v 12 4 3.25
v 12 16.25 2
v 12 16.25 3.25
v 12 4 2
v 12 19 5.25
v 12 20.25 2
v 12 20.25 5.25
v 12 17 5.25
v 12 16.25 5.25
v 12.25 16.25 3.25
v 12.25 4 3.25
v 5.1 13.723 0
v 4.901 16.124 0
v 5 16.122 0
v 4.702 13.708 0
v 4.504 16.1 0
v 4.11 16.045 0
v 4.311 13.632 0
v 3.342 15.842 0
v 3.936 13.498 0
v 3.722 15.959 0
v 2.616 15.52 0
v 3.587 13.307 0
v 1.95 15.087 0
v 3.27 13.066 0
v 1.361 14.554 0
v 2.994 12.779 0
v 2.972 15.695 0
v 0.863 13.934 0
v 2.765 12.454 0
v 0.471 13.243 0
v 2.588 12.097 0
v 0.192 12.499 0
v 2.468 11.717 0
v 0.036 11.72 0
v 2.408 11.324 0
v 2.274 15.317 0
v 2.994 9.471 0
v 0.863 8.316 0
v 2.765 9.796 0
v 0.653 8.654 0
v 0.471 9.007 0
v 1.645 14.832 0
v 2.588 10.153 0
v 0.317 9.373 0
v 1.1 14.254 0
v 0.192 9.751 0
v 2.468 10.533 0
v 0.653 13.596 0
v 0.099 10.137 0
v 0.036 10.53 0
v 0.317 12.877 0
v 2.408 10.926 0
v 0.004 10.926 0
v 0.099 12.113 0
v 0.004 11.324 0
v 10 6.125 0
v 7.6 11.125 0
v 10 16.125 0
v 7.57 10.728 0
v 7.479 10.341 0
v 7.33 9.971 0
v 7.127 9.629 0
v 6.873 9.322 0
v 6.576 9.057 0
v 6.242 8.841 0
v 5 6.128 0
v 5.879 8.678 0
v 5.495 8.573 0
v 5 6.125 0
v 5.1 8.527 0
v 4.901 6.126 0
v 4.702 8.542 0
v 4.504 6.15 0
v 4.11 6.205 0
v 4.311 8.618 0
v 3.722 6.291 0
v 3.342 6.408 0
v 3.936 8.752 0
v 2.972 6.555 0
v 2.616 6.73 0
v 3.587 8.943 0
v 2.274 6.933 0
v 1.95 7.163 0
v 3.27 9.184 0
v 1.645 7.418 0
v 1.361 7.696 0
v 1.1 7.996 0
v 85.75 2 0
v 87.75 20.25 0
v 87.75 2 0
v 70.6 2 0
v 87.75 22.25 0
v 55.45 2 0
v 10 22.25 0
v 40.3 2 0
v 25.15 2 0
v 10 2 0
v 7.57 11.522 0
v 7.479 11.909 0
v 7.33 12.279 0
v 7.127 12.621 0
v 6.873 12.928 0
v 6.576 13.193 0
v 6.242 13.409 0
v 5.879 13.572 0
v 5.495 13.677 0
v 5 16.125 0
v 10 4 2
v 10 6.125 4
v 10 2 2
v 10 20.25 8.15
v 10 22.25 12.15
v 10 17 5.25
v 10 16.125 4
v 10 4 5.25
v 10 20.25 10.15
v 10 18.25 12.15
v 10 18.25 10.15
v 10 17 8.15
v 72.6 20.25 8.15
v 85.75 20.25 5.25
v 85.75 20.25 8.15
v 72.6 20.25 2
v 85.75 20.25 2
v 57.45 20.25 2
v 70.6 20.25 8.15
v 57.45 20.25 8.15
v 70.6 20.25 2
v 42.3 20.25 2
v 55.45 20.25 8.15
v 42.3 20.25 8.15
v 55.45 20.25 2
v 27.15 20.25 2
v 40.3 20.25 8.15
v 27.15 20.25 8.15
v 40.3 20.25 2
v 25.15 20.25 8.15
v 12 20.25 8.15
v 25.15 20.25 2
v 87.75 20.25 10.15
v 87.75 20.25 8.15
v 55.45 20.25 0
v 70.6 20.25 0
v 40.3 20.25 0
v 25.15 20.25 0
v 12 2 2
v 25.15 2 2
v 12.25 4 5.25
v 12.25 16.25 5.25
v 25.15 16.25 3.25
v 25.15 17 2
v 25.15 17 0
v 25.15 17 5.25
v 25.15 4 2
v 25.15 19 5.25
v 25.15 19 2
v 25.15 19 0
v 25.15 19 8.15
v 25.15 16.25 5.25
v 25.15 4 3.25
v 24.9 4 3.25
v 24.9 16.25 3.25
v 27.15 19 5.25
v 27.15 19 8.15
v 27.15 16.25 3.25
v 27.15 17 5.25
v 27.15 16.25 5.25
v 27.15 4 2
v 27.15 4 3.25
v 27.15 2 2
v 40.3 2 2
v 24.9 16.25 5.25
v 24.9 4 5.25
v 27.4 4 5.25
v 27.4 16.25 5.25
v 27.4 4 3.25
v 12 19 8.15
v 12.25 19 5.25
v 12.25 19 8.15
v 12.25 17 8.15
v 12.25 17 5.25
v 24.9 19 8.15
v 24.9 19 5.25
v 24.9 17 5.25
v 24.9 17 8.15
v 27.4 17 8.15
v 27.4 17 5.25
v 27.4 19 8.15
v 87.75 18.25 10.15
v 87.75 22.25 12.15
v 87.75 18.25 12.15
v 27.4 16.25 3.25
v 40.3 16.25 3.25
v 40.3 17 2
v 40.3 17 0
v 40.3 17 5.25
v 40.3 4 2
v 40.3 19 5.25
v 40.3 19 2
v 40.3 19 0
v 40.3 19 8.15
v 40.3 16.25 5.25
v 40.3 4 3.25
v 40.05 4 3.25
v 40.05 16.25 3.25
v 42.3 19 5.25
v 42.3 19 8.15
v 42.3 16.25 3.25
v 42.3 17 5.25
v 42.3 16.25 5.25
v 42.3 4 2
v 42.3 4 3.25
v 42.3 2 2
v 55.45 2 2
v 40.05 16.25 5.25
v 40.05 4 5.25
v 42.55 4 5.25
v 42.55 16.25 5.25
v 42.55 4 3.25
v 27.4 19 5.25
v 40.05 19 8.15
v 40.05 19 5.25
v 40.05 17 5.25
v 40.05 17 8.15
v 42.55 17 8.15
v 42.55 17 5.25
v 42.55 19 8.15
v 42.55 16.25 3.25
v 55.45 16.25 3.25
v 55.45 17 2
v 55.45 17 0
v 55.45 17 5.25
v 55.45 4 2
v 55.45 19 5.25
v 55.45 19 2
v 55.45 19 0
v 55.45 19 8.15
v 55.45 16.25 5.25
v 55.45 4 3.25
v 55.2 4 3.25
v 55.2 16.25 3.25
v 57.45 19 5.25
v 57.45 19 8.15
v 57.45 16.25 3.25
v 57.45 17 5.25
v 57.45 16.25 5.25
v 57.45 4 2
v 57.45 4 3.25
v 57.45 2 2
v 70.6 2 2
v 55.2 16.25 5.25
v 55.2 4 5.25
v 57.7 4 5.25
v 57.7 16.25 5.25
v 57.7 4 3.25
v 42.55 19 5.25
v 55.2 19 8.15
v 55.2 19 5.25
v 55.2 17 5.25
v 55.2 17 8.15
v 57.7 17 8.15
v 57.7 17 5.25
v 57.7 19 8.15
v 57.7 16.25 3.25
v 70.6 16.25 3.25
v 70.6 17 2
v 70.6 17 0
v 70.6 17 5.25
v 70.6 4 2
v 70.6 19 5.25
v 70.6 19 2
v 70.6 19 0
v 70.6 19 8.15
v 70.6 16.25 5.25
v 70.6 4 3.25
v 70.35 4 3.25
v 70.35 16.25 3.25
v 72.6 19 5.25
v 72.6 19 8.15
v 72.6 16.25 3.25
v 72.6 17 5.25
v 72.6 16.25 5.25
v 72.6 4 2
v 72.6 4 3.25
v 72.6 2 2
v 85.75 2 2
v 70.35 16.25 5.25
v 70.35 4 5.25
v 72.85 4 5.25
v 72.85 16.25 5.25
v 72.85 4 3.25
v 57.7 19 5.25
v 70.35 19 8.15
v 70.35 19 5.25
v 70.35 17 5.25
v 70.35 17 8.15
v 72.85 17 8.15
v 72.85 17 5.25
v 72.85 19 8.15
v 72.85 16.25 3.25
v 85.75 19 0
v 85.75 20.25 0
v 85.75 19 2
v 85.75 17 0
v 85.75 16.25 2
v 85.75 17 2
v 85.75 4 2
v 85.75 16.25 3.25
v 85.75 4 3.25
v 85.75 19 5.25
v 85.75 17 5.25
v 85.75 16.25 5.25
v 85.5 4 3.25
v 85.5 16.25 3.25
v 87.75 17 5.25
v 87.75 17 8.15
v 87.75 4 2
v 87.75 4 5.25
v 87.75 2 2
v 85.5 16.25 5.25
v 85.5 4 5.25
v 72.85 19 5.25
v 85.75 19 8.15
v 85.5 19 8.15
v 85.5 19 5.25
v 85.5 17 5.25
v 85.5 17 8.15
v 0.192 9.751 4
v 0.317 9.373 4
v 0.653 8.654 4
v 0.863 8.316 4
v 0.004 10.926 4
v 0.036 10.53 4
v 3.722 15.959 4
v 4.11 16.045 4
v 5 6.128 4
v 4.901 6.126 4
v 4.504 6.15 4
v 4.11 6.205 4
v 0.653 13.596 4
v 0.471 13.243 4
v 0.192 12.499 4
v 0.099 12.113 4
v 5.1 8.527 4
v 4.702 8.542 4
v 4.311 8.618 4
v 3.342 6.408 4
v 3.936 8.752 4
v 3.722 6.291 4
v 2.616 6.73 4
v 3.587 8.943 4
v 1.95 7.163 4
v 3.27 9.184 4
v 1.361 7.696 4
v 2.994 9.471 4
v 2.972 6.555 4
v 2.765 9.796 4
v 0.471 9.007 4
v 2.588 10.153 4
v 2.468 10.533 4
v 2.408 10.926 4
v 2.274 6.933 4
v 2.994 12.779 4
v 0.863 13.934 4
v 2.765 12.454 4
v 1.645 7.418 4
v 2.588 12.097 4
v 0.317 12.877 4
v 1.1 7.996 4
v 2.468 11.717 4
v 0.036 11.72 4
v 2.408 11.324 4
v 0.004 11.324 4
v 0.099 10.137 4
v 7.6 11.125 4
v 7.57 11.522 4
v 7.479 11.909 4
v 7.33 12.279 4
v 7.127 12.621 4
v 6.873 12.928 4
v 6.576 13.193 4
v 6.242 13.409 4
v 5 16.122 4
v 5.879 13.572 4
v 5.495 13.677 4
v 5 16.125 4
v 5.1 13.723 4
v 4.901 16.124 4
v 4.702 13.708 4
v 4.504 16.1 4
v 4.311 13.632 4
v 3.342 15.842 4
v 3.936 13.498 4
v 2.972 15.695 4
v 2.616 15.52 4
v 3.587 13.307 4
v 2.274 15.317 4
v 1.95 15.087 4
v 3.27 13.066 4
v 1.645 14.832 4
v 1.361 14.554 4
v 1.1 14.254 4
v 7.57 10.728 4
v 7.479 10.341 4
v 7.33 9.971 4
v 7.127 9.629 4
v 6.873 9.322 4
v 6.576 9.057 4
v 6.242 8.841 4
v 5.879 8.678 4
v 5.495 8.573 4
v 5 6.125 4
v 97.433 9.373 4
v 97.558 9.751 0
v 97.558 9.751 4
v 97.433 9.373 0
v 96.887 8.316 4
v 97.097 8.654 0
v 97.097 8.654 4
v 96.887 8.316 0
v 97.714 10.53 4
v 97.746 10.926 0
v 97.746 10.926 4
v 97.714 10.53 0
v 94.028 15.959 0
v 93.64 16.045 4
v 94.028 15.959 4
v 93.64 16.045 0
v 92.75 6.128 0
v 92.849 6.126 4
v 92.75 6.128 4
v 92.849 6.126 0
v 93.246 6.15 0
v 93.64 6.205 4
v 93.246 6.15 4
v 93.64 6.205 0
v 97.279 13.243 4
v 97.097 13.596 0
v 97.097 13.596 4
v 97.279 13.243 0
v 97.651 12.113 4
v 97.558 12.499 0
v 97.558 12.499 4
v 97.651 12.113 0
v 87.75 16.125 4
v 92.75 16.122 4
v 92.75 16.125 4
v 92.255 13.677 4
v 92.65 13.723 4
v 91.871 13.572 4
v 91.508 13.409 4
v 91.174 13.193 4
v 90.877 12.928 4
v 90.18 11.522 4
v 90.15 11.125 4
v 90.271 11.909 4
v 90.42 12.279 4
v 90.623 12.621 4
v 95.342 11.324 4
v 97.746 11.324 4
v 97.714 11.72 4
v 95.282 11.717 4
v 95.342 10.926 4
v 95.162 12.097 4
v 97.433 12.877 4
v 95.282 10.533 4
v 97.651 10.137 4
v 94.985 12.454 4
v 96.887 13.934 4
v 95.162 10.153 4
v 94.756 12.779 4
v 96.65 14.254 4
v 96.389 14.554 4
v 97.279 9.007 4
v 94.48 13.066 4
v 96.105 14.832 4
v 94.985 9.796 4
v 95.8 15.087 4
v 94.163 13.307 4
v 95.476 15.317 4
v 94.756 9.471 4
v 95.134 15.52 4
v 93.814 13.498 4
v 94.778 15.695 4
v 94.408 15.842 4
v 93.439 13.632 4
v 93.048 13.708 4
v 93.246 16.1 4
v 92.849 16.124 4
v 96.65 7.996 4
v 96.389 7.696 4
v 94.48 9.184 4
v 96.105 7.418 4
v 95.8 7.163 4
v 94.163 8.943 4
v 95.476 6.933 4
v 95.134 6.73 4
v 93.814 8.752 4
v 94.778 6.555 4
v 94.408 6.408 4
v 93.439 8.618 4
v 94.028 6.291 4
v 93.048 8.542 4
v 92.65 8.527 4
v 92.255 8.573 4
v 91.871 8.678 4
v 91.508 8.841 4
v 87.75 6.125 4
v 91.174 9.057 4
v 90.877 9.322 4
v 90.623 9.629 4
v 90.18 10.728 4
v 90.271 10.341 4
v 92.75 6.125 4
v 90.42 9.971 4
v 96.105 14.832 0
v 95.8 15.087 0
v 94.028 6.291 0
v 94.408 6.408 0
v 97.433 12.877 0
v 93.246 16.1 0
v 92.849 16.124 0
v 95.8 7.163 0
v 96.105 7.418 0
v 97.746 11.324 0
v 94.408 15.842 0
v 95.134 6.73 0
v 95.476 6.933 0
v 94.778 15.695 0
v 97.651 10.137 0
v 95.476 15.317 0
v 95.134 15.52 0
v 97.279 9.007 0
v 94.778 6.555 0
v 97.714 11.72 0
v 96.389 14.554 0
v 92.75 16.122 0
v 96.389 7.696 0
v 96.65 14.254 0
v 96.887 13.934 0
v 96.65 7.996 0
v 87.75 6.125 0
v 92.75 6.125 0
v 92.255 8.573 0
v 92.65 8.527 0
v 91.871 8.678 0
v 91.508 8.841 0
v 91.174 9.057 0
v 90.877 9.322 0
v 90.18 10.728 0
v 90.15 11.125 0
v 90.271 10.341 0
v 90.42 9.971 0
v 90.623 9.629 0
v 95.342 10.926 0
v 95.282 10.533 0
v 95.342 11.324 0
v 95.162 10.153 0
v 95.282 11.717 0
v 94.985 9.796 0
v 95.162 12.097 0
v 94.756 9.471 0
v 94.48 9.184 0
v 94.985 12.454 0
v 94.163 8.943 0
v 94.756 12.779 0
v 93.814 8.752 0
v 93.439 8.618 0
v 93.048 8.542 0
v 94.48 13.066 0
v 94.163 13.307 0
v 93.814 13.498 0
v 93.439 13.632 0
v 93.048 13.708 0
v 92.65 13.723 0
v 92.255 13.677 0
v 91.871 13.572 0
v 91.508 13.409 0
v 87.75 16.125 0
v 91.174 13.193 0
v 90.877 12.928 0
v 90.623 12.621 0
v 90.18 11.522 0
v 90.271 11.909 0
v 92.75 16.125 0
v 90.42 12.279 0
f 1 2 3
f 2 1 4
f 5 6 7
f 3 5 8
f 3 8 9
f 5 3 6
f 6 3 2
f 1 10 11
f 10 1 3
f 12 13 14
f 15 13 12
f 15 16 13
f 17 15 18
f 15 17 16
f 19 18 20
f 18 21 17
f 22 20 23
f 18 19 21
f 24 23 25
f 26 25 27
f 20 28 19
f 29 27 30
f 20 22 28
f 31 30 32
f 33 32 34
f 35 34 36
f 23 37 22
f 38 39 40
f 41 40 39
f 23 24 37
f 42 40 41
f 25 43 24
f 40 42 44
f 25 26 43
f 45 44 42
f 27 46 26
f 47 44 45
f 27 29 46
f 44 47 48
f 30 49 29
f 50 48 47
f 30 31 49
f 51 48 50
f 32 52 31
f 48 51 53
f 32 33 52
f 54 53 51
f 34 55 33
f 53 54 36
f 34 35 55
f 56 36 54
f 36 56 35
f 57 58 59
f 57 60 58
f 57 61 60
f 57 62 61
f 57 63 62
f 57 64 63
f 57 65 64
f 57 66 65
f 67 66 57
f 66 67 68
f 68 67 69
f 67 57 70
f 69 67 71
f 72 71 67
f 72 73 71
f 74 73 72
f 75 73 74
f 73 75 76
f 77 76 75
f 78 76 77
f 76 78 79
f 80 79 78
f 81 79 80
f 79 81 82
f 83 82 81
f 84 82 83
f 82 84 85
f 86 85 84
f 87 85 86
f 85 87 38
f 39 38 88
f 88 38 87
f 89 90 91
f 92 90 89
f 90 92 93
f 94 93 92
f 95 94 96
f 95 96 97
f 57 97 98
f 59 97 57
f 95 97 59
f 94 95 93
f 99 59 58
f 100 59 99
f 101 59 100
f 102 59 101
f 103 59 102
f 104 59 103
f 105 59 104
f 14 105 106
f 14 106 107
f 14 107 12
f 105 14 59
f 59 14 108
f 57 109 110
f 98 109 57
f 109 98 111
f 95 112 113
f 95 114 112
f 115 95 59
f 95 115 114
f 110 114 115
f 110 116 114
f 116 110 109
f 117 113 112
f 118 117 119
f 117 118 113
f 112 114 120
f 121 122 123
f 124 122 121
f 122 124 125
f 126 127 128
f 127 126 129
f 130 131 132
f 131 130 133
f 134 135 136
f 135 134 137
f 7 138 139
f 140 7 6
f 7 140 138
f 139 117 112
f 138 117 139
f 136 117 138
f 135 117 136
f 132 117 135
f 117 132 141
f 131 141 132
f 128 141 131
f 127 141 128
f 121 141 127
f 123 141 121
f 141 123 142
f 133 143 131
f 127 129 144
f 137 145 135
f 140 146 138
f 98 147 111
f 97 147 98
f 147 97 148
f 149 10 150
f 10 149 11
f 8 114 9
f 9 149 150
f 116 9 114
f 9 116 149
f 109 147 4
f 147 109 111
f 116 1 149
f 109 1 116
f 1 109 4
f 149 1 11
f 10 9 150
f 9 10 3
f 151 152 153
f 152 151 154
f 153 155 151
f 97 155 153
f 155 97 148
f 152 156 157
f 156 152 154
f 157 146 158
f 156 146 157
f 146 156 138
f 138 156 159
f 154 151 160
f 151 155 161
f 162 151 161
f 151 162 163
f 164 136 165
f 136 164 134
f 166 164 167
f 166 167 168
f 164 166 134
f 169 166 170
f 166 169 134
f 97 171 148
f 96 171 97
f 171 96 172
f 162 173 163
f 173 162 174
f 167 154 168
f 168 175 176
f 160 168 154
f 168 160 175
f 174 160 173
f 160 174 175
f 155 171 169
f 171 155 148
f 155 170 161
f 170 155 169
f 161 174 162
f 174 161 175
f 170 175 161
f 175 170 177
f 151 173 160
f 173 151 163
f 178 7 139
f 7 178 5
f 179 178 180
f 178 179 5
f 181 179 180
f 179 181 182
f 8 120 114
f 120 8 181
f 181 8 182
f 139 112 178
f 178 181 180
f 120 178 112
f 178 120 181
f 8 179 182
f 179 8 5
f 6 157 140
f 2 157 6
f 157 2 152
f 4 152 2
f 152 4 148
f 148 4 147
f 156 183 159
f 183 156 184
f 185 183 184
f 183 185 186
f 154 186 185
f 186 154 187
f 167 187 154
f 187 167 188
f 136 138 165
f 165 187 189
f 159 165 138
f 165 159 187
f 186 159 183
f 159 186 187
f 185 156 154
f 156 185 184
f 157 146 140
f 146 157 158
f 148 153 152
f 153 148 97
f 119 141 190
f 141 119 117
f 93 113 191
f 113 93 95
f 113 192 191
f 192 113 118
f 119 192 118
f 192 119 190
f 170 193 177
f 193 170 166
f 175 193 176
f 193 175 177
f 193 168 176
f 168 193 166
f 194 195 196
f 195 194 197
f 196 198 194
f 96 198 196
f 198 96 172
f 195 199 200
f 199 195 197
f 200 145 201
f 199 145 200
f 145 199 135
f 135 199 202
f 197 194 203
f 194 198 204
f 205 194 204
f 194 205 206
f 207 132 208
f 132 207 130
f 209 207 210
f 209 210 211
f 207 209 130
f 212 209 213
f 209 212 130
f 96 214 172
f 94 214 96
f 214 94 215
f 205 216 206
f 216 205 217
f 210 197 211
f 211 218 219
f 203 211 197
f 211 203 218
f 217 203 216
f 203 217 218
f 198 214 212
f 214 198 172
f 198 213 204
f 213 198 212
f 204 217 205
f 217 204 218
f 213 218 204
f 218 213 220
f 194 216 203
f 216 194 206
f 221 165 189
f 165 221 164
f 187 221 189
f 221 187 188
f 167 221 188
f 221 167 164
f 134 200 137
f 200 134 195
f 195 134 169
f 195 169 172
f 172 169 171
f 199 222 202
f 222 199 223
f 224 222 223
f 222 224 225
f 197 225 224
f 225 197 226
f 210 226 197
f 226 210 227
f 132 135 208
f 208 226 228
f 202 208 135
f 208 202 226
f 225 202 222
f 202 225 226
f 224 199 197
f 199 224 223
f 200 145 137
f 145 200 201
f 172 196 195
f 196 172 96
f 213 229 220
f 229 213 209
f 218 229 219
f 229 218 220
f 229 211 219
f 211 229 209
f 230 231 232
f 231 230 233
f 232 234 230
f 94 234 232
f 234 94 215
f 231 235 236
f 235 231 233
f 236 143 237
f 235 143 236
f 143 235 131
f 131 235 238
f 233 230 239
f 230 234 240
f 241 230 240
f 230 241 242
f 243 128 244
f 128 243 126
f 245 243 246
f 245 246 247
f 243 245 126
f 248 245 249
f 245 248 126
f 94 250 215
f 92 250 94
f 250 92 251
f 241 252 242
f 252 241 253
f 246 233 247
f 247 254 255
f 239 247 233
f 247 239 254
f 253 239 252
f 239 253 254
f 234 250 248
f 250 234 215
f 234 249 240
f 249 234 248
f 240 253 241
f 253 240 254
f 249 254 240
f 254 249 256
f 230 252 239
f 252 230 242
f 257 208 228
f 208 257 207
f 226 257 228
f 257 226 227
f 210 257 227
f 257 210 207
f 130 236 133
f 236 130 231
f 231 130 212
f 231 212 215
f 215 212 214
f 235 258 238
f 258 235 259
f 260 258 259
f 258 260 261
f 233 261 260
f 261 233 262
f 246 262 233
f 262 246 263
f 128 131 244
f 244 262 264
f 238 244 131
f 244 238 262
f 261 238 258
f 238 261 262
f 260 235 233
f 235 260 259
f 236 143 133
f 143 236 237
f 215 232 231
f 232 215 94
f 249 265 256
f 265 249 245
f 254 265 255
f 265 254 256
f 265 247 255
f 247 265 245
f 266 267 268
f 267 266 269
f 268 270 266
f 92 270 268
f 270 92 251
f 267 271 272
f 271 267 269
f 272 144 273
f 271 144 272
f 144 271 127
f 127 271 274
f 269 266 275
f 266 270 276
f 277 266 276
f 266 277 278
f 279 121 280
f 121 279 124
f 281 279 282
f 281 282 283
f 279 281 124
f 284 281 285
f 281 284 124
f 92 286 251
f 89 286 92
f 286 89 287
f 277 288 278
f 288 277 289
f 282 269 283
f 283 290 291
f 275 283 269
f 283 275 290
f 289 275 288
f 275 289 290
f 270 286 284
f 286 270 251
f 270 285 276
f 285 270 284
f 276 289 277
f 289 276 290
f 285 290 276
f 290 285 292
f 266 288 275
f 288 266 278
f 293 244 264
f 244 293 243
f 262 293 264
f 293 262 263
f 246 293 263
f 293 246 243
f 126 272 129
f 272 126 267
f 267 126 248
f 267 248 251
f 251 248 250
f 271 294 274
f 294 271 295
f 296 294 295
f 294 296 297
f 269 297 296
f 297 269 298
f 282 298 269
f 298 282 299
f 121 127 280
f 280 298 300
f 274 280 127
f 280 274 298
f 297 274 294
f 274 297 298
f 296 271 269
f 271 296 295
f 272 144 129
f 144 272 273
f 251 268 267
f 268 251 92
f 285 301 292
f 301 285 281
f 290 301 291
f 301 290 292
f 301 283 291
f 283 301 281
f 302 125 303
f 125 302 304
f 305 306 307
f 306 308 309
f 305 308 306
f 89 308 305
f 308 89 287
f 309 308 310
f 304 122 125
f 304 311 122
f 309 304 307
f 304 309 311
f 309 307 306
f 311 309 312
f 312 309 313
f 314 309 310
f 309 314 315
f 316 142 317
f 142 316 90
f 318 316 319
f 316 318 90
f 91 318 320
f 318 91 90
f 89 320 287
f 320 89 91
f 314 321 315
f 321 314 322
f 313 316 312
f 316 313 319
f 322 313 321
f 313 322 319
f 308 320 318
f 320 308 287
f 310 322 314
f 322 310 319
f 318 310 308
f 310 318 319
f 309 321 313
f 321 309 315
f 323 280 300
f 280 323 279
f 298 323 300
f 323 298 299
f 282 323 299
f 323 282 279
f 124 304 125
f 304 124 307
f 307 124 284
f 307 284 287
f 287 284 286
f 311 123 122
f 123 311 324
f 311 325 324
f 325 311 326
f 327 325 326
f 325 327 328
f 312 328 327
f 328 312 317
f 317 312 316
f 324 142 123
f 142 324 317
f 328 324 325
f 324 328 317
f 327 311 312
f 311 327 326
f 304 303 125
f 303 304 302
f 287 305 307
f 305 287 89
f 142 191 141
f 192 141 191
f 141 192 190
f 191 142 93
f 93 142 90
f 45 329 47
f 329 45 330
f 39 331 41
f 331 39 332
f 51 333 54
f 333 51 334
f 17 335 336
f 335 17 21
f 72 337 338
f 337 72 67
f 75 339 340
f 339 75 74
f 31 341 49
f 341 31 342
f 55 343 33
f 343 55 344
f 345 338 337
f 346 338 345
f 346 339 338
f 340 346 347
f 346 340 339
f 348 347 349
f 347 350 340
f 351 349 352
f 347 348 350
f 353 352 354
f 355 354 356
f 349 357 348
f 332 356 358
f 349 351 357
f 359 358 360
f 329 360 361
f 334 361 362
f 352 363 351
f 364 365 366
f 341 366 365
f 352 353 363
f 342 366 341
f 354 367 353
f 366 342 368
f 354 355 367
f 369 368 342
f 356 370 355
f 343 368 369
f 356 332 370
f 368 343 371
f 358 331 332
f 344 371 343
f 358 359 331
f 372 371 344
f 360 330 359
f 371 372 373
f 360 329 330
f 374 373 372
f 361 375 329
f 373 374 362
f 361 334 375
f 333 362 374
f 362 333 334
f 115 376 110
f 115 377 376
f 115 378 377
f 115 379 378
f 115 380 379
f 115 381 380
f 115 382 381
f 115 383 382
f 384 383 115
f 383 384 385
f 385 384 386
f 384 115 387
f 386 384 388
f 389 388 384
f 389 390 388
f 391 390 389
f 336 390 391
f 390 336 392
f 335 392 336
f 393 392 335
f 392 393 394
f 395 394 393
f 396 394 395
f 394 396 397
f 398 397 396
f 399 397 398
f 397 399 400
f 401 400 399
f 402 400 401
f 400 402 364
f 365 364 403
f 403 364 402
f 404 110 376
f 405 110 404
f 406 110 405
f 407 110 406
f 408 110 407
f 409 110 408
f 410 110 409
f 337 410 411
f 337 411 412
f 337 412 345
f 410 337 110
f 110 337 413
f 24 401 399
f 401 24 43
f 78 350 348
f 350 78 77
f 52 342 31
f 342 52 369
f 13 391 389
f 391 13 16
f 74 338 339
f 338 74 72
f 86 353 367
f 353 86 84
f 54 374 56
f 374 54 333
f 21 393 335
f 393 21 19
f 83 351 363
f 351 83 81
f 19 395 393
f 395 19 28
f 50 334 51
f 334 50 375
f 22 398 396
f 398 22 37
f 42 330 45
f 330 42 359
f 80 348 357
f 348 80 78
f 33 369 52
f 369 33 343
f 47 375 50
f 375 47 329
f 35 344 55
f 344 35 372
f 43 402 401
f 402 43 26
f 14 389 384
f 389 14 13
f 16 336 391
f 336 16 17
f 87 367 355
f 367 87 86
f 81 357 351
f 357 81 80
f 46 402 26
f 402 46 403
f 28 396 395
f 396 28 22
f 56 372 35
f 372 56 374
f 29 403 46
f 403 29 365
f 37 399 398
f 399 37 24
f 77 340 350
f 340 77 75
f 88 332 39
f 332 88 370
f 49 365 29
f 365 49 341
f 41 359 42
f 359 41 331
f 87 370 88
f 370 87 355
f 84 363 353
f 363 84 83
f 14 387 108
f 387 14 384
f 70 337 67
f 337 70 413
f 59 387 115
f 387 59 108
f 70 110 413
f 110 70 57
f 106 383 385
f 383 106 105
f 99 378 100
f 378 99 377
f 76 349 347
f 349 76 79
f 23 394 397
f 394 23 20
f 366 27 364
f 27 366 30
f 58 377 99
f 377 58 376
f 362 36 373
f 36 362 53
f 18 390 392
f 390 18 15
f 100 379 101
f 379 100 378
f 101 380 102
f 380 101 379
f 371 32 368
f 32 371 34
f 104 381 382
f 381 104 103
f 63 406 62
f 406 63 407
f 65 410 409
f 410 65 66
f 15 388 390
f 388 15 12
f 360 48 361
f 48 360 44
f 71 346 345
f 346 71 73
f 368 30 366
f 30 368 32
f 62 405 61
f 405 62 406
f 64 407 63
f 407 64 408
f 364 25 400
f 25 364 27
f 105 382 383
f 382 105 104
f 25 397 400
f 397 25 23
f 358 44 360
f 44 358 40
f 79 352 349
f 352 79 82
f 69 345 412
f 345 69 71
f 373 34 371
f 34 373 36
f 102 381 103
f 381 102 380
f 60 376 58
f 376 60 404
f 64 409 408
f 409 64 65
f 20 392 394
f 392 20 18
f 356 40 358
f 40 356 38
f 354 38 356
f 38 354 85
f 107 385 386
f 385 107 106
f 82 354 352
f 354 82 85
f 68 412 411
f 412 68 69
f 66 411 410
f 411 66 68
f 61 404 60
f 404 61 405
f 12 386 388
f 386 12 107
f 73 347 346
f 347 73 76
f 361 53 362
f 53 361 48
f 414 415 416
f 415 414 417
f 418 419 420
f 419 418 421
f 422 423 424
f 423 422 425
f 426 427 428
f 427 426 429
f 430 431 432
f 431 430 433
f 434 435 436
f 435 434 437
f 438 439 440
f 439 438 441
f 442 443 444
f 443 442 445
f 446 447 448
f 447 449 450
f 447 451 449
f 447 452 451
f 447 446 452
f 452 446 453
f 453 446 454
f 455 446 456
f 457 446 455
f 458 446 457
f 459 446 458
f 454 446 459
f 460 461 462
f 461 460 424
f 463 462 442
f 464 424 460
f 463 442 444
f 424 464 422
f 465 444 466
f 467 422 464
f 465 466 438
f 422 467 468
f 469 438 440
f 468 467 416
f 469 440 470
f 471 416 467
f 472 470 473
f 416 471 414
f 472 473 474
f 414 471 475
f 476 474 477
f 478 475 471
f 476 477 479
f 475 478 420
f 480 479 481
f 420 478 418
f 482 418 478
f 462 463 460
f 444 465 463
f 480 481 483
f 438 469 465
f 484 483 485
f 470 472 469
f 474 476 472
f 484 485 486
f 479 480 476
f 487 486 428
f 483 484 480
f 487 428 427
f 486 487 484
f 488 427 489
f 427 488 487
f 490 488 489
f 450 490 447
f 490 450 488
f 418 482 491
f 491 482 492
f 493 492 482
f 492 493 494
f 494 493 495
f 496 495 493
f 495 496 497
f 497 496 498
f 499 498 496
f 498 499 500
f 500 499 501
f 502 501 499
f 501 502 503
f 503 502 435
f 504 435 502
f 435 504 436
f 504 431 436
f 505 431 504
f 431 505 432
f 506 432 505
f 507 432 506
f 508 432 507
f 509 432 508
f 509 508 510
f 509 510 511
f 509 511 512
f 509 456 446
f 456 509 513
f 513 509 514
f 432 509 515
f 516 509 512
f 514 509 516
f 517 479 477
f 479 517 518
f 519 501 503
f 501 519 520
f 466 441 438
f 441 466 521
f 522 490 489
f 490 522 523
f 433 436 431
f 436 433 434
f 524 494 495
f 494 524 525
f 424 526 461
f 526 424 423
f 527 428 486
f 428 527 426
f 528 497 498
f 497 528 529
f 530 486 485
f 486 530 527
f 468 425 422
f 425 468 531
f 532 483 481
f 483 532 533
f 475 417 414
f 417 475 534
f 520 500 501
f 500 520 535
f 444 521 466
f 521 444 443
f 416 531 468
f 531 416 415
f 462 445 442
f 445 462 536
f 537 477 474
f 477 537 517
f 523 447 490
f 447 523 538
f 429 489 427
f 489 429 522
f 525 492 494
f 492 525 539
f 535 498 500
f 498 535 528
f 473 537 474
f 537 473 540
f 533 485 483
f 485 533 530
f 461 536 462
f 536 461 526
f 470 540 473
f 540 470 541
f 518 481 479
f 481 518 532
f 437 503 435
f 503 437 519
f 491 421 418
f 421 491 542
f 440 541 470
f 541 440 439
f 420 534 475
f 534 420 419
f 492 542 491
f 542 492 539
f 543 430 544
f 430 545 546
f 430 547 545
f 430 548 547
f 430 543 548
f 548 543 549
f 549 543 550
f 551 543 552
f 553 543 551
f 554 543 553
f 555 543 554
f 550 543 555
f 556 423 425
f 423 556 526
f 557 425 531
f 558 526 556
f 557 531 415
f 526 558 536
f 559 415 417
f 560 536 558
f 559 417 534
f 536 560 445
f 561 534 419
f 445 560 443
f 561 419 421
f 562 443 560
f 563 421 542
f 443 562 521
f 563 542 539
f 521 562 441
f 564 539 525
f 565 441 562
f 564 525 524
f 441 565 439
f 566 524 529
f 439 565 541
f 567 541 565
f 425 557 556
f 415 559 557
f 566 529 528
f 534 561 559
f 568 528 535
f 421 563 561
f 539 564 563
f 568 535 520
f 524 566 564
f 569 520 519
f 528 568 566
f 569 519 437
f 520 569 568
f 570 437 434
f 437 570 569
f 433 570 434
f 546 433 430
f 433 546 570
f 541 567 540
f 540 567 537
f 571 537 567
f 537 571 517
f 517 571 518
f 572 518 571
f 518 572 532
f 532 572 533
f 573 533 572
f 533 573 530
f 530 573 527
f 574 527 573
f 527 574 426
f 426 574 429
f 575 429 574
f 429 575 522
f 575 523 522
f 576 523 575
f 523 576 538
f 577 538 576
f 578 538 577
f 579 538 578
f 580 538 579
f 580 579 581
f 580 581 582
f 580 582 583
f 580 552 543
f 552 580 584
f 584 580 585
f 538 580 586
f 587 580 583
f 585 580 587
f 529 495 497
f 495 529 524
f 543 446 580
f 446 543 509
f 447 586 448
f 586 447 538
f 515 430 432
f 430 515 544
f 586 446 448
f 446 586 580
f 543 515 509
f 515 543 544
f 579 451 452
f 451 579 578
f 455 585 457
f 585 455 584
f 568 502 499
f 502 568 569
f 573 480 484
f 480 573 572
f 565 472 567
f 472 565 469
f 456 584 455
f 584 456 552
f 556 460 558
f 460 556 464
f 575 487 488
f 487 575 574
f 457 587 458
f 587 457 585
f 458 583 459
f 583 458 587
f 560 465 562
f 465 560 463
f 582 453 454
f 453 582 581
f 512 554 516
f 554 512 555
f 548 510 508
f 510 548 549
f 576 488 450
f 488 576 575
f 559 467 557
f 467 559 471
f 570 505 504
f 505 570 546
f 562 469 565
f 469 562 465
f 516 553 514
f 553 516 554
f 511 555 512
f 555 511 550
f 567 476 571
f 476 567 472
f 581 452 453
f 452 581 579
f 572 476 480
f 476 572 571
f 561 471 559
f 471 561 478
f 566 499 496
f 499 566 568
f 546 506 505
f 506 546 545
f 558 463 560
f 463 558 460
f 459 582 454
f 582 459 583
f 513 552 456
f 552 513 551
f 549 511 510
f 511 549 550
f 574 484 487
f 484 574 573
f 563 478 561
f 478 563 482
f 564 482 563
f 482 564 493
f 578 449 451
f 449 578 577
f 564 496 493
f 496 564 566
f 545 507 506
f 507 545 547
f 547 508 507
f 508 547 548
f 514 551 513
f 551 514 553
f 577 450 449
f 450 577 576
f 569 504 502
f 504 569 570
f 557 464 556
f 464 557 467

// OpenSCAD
// ////////////////////////////////////////////////
//
// WAGO 221 mount
//
// Creates a single row or double row set of 221 blocks
// with mounting tabs/ears at either end.
//
// Created - 2017/01/01 by Joo Chung
//
//
// Downloaded from https://www.thingiverse.com/thing:2075219/
//
// - added an extra module `wago_mount(blocks, join=1)` to use it in another project
// - added an extra function `wago_mount_width(blocks)` for calculating the complete mount width
// - fixed warnings about calls to mirror() without vector
// - prefixed all functions and modules with `wago_` as a poor mans implementation of a namespace
// ////////////////////////////////////////////////

// ////////////////////////////////////////////////
// vector of blocks. each element specifies the number of conductors for that block
// EDIT THIS
blocks = [2,2,2,2,2]; // a single 5 conductor blocks
// blocks = [5, 3, 2]; // a set of 5 conductor, 3 conductor, 2 conductor blocks
// blocks = [5, 5, 5]; // a set of three 5 conductor blocks
// blocks = [2]; // a single 2 conductor block
// blocks = [3]; // a single 3 conductor block


// ////////////////////////////////////////////////
// Mirror the mount, stand it up, and put tabs on bottom.
// 0 - no mirror, 1 - mirror, rotate so its standing up, and reposition tabs
// 2 - mirror, rotate so that they are laying flat, and reposition tabs.
// EDIT THIS
body_shape = 0;

// ////////////////////////////////////////////////
// Tabs - include or exclude mounting tabs
// EDIT THIS: 0 - no tabs, 1 - tabs
tabs      =  1;
// EDIT THIS: radius of hole in tab
tabradius =  2.6;
// EDIT THIS: thickness of tab
tabheight =  4;
// EDIT THIS: Set width and length of the tab. (tab is basically a square)
tabwidth  = 10;



// ////////////////////////////////////////////////
// Block dimensions in mm -- DO NOT EDIT
conwidth   =  5.6; // width of a single conductor
// DO NOT EDIT
border     =  1.75; // block transparent plastic border
// DO NOT EDIT
blockdepth = 18.25;
// DO NOT EDIT
fudge      =  0.2;


// ////////////////////////////////////////////////
// OpenSCAD special variables -- DO NOT EDIT
$fa = 1;
// DO NOT EDIT
$fs = 0.4;


// ////////////////////////////////////////////////
// Functions

// block width
function wago_bw(x) = conwidth*x+border+fudge;

// mount width (list of blocks, index, max index)
function wago_mw(block_list, i, n) = ( i==0 ? wago_bw(block_list[i]) + 2 + wago_mw(block_list, i+1, n) : (i < n ? wago_bw(block_list[i]) + 2 + wago_mw(block_list, i+1, n) : 0));

// full mount width, including closing wall
function wago_mount_width(block_list) = wago_mw(block_list, 0, len(block_list))+ 2;

// ////////////////////////////////////////////////
// Modules

module wago_tab(width, hole, thickness) {
    difference() {
        union () {
            cylinder(thickness,width/2,width/2, true);
            translate([width/4,0,0]) cube([width/2,width,thickness], true);
        }
    cylinder(width,hole,hole, true);
    }
}


module wago_shoulder (depth) {
    difference () {
        union () {
            cube([2, blockdepth, 3.25], false);
            translate([0,0,3.25]) cube([2.25, blockdepth, 2], false);
        }
        translate([0,0,2]) cube([2.25,2,3.25], false);
        translate([2,blockdepth-4,2]) cube([0.25,4,3.25], false);
    }
}


module wago_backshoulder (height) {
    difference() {
        union() {
            translate([0, 2, 0]) cube ([2, 1.25, 10.15]);
            cube ([2.25, 2, 10.15]);
        }
        translate([0,0,10.15-2]) cube([2.25,3.25,2]);
        translate([2,0,2]) cube([1.25,3.25,3.25]);
    }
}


// WAGO 221 block
module wago_block (nconn) {
    blockwidth = wago_bw(nconn);

    // base
    translate([2,2,0]) cube([blockwidth, blockdepth, 2], false);

    // back headboard
    translate([0,blockdepth+2,0]) cube([blockwidth+4, 2, 10.15], false);

    // back lip
    translate([0,blockdepth,10.15]) cube([blockwidth+4, 4, 2], false);

    // front lip
    //translate([0,0,0]) cube([blockwidth+4, 2, 2.5], false);

    // left shoulder and right shoulders
    translate([0,2,0]) wago_shoulder();
    translate([blockwidth+4,2,0]) mirror([1,0,0]) wago_shoulder();

    // back left and shoulder
    translate([0, blockdepth-1.25, 0]) wago_backshoulder();
    translate([blockwidth+4, blockdepth -1.25, 0]) mirror([1,0,0]) wago_backshoulder();

}


module wago_mount(block_list=blocks, join=1) {
    // a single strip of wago mounts for use in other projects

    cut_size = [wago_mount_width(block_list) + 2, blockdepth + 4, 15];

    difference() {
        // mount, as defined by the original module
        translate([0, -2, -2])
            for (i=[0:len(block_list)-1]) {
                offset = (i==0) ? 0 : wago_mw(block_list, 0, i);
                translate([offset, 0, 0]) wago_block(block_list[i]);
            }

        // cut off excess material
        translate([-1, blockdepth + join, -3])
            cube(cut_size);
        translate([-1, -1, -cut_size.z - join])
            cube(cut_size);
    }
}



// ////////////////////////////////////////////////
// MAIN BODY
mountwidth=wago_mw(blocks, 0, len(blocks));
if (body_shape==0) { // No mirror. Single row of blocks
    // create array of blocks
    for (i=[0:len(blocks)-1]) {
        offset = (i==0) ? tabwidth : tabwidth + wago_mw(blocks, 0, i);
        translate([offset, 0, 0]) wago_block(blocks[i]);
    }

    // left and right tabs
    if (tabs==1) {
        translate([tabwidth/2,(blockdepth+4)/2,tabheight/2]) wago_tab (tabwidth, tabradius, tabheight);
        translate([mountwidth+2+tabwidth+tabwidth/2,(blockdepth+4)/2,tabheight/2]) mirror([1,0,0]) wago_tab (tabwidth, tabradius, tabheight);
    }
} else if (body_shape==1) { // Mirrored. two rows of blocks, back to back.
    // Row #1. Stand up on headboard.
    rotate([-90,0,0]) for (i=[0:len(blocks)-1]) {
        offset = (i==0) ? tabwidth : tabwidth + wago_mw(blocks, 0, i);
        translate([offset, 0, -1]) wago_block(blocks[i]);
    }

    // Row #2. Opposite rotation. Stand up on headbord
    rotate([90,0,0]) mirror ([0, 1, 0]) for (i=[0:len(blocks)-1]) {
        offset = (i==0) ? tabwidth : tabwidth + wago_mw(blocks, 0, i);
        translate([offset, 0, -1]) wago_block(blocks[i]);
    }

    // left and right tabs
    if (tabs==1) {
        translate([tabwidth/2,0,-blockdepth-tabheight/2]) wago_tab (tabwidth, tabradius, tabheight);
        translate([mountwidth+2+tabwidth+tabwidth/2,0,-blockdepth-tabheight/2]) mirror([1,0,0]) wago_tab (tabwidth, tabradius, tabheight);
    }
} else if (body_shape==2) {
    // Row #1.
    for (i=[0:len(blocks)-1]) {
        offset = (i==0) ? tabwidth : tabwidth + wago_mw(blocks, 0, i);
        translate([offset, -blockdepth-6, -1]) wago_block(blocks[i]);
    }

    // Row #2. Flip
    mirror ([0, 1, 0]) for (i=[0:len(blocks)-1]) {
        offset = (i==0) ? tabwidth : tabwidth + wago_mw(blocks, 0, i);
        translate([offset, -blockdepth, -1]) wago_block(blocks[i]);
    }

    // left and right tabs
    if (tabs==1) {
        translate([tabwidth/2,-3,(tabheight-2)/2]) wago_tab (tabwidth, tabradius, tabheight);
        translate([mountwidth+2+tabwidth+tabwidth/2,-3,(tabheight-2)/2]) mirror([1,0,0]) wago_tab (tabwidth, tabradius, tabheight);
    }
}
